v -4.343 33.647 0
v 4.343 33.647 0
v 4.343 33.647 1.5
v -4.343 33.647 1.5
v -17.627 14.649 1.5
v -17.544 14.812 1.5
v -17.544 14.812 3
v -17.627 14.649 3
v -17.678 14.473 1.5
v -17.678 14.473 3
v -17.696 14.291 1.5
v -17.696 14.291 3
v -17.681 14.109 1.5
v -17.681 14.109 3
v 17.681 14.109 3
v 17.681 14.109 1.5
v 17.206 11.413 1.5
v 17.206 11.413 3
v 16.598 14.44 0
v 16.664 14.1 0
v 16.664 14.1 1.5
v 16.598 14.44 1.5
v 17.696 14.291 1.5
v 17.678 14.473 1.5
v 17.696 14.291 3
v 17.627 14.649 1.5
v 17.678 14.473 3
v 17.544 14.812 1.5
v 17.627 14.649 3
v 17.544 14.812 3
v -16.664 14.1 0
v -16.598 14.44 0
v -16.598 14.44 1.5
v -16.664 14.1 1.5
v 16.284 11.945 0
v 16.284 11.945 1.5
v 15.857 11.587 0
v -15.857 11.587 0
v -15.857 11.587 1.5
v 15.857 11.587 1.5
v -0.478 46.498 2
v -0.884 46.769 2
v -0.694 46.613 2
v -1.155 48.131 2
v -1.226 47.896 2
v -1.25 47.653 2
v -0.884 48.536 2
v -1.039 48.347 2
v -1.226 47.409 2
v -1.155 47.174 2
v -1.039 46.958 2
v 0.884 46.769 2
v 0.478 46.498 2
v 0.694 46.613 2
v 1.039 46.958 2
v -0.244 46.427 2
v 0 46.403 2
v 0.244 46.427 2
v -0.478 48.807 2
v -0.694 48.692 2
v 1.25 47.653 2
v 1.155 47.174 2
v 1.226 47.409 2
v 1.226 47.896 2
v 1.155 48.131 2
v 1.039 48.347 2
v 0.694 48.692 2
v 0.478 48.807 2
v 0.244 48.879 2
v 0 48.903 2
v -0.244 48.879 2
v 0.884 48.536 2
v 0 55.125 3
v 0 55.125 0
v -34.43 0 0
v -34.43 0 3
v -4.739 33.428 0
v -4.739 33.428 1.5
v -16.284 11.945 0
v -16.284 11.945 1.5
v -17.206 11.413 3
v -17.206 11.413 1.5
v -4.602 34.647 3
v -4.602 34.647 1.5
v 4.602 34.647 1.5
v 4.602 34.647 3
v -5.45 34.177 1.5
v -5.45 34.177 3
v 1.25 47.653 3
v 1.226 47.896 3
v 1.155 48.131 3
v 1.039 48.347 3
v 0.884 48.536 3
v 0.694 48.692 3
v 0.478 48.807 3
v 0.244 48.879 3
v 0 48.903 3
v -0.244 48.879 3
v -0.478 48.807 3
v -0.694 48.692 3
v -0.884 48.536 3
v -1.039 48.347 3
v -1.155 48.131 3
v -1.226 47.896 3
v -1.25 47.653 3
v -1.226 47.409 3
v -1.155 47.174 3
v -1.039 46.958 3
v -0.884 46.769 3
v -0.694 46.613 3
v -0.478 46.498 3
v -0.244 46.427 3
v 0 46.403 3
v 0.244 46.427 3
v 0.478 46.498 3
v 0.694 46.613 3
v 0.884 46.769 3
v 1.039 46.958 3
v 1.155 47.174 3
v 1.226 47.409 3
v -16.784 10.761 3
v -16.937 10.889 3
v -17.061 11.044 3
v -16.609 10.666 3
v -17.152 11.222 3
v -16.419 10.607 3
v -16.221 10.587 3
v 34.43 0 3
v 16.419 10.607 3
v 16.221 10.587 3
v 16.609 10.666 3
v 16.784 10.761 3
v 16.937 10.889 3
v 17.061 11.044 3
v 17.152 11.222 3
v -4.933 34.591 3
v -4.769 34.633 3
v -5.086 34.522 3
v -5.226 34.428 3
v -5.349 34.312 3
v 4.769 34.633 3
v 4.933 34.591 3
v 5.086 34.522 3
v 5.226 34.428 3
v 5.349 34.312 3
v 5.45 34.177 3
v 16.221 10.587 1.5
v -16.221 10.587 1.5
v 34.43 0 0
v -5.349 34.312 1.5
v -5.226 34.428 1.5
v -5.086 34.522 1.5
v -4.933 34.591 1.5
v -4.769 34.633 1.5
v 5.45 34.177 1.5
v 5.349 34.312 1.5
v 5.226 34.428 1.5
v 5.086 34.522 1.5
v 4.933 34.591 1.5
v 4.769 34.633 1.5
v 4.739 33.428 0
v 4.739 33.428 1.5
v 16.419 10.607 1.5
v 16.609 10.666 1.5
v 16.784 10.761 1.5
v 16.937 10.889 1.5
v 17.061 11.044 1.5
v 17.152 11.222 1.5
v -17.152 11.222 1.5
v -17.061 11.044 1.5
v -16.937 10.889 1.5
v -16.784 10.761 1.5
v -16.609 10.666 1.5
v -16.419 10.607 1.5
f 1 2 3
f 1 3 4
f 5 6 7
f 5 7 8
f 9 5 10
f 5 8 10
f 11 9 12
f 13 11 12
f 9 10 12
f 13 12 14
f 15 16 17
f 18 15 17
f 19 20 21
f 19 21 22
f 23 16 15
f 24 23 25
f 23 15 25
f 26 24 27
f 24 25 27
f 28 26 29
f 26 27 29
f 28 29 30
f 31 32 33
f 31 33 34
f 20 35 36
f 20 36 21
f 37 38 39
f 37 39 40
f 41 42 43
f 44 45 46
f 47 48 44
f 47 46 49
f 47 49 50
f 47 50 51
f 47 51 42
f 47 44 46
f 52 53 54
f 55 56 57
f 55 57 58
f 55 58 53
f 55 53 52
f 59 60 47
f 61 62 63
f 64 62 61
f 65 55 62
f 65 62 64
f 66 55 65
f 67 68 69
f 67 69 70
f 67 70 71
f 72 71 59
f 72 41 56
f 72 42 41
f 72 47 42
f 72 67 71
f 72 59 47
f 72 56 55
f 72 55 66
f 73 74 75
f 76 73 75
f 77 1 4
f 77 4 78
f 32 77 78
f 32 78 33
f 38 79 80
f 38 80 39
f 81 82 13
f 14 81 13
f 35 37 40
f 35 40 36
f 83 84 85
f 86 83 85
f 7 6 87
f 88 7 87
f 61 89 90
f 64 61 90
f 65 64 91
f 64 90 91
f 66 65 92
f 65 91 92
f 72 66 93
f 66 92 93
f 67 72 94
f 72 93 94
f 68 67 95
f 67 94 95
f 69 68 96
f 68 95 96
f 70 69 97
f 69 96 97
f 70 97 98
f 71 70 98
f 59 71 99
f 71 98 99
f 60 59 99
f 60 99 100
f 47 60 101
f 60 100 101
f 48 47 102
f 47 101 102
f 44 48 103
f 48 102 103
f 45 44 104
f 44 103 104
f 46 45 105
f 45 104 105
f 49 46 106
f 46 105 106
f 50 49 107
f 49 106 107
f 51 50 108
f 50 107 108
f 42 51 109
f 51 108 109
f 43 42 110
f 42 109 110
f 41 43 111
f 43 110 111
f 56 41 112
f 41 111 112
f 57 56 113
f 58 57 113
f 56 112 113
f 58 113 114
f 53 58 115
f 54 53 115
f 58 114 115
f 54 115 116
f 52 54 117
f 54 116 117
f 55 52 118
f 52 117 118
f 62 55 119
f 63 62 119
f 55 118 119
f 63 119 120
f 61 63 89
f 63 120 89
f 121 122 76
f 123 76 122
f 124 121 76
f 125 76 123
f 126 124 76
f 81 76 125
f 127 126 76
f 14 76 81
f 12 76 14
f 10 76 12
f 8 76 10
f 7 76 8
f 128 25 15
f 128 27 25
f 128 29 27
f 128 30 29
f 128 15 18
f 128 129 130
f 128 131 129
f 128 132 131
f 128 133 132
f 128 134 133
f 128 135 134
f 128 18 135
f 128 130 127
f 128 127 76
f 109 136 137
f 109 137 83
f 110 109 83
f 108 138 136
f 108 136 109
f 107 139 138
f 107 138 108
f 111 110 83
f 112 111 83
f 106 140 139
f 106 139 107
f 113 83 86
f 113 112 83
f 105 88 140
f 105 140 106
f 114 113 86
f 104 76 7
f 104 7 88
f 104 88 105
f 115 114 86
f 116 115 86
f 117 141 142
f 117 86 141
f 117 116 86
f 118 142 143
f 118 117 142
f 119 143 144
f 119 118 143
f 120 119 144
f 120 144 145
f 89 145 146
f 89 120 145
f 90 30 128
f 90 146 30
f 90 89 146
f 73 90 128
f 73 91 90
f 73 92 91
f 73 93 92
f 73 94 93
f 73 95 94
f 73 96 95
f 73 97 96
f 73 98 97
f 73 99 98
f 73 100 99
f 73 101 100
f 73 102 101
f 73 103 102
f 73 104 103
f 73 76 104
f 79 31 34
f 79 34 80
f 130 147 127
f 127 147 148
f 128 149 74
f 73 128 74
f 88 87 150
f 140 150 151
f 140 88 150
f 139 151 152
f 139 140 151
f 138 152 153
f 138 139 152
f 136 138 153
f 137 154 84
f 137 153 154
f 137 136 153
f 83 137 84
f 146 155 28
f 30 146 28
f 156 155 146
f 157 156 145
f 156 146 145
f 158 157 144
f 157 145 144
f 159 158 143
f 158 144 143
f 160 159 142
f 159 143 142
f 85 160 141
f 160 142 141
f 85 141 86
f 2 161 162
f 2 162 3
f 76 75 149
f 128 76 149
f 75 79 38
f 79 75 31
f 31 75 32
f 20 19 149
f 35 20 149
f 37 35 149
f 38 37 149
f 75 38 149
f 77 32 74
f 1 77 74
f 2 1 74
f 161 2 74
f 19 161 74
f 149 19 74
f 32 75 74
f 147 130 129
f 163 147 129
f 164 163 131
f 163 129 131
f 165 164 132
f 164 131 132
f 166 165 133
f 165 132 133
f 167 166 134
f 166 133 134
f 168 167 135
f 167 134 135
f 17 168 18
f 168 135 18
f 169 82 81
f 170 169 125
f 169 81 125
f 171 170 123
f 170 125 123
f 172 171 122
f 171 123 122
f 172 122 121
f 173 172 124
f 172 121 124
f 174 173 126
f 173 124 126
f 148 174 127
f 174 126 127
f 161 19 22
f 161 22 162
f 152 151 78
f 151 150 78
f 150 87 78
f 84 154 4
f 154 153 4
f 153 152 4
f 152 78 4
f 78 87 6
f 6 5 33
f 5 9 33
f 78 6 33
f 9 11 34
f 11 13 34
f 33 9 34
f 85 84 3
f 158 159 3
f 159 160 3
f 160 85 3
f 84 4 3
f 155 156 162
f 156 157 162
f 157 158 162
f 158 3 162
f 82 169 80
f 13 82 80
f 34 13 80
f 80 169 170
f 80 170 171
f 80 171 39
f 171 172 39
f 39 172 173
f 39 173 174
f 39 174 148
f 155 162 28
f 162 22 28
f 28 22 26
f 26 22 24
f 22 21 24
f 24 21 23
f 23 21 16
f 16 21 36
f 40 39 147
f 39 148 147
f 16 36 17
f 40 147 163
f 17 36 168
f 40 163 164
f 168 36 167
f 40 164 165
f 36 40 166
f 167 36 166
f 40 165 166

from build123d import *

# Parameters (mm, degrees)
F1_DEPTH = 3
F2_R     = 1
F3_R     = 1.25
F4_DEPTH = 1
F6_DEPTH = 1.5


with BuildPart() as f1:
    # F0 (on Top) → F1 (new body)
    with BuildSketch(Plane.XY):
        Polygon((0, 55.125), (-34.43, 0), (34.43, 0), align=None)
        Polygon((-5.15597, 34.647), (5.15597, 34.647), (17.74764, 14.486798), (17.06, 10.587), (-17.06, 10.587), (-17.74764, 14.486798), align=None, mode=Mode.SUBTRACT)
    extrude(amount=F1_DEPTH)

    # F2
    f2_edges = [f1.edges().sort_by_distance(p)[0] for p in [
        (17.06, 10.587, 1.5),
        (-17.06, 10.587, 1.5),
        (17.74764, 14.486798, 1.5),
        (-17.74764, 14.486798, 1.5),
        (5.15597, 34.647, 1.5),
        (-5.15597, 34.647, 1.5),
    ]]
    fillet(f2_edges, radius=F2_R)

    # F3 (on face) → F4 (cut)
    with BuildSketch(Plane.XY.offset(3)):
        with Locations((0, 47.652587)):
            Circle(F3_R)
    extrude(amount=-F4_DEPTH, mode=Mode.SUBTRACT)

    # F5 (on face) → F6 (join)
    with BuildSketch(Plane(origin=(0, 0, 0), x_dir=(1, 0, 0), z_dir=(0, 0, -1))):
        Polygon((20.099395, -15.818272), (20.426854, -14.132703), (19.694041, -9.976712), (17.20362, -7.887), (-17.20362, -7.887), (-19.694041, -9.976712), (-20.426854, -14.132703), (-20.099395, -15.818272), (-7.369729, -36.199417), (-5.299942, -37.347), (5.299942, -37.347), (7.369729, -36.199417), align=None)
        Polygon((4.342852, -33.647), (-4.342852, -33.647), (-4.738556, -33.427604), (-16.598042, -14.439682), (-16.664021, -14.10006), (-16.284103, -11.945441), (-15.85693, -11.587), (15.85693, -11.587), (16.284103, -11.945441), (16.664021, -14.10006), (16.598042, -14.439682), (4.738556, -33.427604), align=None, mode=Mode.SUBTRACT)
    extrude(amount=-F6_DEPTH)


solid = f1.part
